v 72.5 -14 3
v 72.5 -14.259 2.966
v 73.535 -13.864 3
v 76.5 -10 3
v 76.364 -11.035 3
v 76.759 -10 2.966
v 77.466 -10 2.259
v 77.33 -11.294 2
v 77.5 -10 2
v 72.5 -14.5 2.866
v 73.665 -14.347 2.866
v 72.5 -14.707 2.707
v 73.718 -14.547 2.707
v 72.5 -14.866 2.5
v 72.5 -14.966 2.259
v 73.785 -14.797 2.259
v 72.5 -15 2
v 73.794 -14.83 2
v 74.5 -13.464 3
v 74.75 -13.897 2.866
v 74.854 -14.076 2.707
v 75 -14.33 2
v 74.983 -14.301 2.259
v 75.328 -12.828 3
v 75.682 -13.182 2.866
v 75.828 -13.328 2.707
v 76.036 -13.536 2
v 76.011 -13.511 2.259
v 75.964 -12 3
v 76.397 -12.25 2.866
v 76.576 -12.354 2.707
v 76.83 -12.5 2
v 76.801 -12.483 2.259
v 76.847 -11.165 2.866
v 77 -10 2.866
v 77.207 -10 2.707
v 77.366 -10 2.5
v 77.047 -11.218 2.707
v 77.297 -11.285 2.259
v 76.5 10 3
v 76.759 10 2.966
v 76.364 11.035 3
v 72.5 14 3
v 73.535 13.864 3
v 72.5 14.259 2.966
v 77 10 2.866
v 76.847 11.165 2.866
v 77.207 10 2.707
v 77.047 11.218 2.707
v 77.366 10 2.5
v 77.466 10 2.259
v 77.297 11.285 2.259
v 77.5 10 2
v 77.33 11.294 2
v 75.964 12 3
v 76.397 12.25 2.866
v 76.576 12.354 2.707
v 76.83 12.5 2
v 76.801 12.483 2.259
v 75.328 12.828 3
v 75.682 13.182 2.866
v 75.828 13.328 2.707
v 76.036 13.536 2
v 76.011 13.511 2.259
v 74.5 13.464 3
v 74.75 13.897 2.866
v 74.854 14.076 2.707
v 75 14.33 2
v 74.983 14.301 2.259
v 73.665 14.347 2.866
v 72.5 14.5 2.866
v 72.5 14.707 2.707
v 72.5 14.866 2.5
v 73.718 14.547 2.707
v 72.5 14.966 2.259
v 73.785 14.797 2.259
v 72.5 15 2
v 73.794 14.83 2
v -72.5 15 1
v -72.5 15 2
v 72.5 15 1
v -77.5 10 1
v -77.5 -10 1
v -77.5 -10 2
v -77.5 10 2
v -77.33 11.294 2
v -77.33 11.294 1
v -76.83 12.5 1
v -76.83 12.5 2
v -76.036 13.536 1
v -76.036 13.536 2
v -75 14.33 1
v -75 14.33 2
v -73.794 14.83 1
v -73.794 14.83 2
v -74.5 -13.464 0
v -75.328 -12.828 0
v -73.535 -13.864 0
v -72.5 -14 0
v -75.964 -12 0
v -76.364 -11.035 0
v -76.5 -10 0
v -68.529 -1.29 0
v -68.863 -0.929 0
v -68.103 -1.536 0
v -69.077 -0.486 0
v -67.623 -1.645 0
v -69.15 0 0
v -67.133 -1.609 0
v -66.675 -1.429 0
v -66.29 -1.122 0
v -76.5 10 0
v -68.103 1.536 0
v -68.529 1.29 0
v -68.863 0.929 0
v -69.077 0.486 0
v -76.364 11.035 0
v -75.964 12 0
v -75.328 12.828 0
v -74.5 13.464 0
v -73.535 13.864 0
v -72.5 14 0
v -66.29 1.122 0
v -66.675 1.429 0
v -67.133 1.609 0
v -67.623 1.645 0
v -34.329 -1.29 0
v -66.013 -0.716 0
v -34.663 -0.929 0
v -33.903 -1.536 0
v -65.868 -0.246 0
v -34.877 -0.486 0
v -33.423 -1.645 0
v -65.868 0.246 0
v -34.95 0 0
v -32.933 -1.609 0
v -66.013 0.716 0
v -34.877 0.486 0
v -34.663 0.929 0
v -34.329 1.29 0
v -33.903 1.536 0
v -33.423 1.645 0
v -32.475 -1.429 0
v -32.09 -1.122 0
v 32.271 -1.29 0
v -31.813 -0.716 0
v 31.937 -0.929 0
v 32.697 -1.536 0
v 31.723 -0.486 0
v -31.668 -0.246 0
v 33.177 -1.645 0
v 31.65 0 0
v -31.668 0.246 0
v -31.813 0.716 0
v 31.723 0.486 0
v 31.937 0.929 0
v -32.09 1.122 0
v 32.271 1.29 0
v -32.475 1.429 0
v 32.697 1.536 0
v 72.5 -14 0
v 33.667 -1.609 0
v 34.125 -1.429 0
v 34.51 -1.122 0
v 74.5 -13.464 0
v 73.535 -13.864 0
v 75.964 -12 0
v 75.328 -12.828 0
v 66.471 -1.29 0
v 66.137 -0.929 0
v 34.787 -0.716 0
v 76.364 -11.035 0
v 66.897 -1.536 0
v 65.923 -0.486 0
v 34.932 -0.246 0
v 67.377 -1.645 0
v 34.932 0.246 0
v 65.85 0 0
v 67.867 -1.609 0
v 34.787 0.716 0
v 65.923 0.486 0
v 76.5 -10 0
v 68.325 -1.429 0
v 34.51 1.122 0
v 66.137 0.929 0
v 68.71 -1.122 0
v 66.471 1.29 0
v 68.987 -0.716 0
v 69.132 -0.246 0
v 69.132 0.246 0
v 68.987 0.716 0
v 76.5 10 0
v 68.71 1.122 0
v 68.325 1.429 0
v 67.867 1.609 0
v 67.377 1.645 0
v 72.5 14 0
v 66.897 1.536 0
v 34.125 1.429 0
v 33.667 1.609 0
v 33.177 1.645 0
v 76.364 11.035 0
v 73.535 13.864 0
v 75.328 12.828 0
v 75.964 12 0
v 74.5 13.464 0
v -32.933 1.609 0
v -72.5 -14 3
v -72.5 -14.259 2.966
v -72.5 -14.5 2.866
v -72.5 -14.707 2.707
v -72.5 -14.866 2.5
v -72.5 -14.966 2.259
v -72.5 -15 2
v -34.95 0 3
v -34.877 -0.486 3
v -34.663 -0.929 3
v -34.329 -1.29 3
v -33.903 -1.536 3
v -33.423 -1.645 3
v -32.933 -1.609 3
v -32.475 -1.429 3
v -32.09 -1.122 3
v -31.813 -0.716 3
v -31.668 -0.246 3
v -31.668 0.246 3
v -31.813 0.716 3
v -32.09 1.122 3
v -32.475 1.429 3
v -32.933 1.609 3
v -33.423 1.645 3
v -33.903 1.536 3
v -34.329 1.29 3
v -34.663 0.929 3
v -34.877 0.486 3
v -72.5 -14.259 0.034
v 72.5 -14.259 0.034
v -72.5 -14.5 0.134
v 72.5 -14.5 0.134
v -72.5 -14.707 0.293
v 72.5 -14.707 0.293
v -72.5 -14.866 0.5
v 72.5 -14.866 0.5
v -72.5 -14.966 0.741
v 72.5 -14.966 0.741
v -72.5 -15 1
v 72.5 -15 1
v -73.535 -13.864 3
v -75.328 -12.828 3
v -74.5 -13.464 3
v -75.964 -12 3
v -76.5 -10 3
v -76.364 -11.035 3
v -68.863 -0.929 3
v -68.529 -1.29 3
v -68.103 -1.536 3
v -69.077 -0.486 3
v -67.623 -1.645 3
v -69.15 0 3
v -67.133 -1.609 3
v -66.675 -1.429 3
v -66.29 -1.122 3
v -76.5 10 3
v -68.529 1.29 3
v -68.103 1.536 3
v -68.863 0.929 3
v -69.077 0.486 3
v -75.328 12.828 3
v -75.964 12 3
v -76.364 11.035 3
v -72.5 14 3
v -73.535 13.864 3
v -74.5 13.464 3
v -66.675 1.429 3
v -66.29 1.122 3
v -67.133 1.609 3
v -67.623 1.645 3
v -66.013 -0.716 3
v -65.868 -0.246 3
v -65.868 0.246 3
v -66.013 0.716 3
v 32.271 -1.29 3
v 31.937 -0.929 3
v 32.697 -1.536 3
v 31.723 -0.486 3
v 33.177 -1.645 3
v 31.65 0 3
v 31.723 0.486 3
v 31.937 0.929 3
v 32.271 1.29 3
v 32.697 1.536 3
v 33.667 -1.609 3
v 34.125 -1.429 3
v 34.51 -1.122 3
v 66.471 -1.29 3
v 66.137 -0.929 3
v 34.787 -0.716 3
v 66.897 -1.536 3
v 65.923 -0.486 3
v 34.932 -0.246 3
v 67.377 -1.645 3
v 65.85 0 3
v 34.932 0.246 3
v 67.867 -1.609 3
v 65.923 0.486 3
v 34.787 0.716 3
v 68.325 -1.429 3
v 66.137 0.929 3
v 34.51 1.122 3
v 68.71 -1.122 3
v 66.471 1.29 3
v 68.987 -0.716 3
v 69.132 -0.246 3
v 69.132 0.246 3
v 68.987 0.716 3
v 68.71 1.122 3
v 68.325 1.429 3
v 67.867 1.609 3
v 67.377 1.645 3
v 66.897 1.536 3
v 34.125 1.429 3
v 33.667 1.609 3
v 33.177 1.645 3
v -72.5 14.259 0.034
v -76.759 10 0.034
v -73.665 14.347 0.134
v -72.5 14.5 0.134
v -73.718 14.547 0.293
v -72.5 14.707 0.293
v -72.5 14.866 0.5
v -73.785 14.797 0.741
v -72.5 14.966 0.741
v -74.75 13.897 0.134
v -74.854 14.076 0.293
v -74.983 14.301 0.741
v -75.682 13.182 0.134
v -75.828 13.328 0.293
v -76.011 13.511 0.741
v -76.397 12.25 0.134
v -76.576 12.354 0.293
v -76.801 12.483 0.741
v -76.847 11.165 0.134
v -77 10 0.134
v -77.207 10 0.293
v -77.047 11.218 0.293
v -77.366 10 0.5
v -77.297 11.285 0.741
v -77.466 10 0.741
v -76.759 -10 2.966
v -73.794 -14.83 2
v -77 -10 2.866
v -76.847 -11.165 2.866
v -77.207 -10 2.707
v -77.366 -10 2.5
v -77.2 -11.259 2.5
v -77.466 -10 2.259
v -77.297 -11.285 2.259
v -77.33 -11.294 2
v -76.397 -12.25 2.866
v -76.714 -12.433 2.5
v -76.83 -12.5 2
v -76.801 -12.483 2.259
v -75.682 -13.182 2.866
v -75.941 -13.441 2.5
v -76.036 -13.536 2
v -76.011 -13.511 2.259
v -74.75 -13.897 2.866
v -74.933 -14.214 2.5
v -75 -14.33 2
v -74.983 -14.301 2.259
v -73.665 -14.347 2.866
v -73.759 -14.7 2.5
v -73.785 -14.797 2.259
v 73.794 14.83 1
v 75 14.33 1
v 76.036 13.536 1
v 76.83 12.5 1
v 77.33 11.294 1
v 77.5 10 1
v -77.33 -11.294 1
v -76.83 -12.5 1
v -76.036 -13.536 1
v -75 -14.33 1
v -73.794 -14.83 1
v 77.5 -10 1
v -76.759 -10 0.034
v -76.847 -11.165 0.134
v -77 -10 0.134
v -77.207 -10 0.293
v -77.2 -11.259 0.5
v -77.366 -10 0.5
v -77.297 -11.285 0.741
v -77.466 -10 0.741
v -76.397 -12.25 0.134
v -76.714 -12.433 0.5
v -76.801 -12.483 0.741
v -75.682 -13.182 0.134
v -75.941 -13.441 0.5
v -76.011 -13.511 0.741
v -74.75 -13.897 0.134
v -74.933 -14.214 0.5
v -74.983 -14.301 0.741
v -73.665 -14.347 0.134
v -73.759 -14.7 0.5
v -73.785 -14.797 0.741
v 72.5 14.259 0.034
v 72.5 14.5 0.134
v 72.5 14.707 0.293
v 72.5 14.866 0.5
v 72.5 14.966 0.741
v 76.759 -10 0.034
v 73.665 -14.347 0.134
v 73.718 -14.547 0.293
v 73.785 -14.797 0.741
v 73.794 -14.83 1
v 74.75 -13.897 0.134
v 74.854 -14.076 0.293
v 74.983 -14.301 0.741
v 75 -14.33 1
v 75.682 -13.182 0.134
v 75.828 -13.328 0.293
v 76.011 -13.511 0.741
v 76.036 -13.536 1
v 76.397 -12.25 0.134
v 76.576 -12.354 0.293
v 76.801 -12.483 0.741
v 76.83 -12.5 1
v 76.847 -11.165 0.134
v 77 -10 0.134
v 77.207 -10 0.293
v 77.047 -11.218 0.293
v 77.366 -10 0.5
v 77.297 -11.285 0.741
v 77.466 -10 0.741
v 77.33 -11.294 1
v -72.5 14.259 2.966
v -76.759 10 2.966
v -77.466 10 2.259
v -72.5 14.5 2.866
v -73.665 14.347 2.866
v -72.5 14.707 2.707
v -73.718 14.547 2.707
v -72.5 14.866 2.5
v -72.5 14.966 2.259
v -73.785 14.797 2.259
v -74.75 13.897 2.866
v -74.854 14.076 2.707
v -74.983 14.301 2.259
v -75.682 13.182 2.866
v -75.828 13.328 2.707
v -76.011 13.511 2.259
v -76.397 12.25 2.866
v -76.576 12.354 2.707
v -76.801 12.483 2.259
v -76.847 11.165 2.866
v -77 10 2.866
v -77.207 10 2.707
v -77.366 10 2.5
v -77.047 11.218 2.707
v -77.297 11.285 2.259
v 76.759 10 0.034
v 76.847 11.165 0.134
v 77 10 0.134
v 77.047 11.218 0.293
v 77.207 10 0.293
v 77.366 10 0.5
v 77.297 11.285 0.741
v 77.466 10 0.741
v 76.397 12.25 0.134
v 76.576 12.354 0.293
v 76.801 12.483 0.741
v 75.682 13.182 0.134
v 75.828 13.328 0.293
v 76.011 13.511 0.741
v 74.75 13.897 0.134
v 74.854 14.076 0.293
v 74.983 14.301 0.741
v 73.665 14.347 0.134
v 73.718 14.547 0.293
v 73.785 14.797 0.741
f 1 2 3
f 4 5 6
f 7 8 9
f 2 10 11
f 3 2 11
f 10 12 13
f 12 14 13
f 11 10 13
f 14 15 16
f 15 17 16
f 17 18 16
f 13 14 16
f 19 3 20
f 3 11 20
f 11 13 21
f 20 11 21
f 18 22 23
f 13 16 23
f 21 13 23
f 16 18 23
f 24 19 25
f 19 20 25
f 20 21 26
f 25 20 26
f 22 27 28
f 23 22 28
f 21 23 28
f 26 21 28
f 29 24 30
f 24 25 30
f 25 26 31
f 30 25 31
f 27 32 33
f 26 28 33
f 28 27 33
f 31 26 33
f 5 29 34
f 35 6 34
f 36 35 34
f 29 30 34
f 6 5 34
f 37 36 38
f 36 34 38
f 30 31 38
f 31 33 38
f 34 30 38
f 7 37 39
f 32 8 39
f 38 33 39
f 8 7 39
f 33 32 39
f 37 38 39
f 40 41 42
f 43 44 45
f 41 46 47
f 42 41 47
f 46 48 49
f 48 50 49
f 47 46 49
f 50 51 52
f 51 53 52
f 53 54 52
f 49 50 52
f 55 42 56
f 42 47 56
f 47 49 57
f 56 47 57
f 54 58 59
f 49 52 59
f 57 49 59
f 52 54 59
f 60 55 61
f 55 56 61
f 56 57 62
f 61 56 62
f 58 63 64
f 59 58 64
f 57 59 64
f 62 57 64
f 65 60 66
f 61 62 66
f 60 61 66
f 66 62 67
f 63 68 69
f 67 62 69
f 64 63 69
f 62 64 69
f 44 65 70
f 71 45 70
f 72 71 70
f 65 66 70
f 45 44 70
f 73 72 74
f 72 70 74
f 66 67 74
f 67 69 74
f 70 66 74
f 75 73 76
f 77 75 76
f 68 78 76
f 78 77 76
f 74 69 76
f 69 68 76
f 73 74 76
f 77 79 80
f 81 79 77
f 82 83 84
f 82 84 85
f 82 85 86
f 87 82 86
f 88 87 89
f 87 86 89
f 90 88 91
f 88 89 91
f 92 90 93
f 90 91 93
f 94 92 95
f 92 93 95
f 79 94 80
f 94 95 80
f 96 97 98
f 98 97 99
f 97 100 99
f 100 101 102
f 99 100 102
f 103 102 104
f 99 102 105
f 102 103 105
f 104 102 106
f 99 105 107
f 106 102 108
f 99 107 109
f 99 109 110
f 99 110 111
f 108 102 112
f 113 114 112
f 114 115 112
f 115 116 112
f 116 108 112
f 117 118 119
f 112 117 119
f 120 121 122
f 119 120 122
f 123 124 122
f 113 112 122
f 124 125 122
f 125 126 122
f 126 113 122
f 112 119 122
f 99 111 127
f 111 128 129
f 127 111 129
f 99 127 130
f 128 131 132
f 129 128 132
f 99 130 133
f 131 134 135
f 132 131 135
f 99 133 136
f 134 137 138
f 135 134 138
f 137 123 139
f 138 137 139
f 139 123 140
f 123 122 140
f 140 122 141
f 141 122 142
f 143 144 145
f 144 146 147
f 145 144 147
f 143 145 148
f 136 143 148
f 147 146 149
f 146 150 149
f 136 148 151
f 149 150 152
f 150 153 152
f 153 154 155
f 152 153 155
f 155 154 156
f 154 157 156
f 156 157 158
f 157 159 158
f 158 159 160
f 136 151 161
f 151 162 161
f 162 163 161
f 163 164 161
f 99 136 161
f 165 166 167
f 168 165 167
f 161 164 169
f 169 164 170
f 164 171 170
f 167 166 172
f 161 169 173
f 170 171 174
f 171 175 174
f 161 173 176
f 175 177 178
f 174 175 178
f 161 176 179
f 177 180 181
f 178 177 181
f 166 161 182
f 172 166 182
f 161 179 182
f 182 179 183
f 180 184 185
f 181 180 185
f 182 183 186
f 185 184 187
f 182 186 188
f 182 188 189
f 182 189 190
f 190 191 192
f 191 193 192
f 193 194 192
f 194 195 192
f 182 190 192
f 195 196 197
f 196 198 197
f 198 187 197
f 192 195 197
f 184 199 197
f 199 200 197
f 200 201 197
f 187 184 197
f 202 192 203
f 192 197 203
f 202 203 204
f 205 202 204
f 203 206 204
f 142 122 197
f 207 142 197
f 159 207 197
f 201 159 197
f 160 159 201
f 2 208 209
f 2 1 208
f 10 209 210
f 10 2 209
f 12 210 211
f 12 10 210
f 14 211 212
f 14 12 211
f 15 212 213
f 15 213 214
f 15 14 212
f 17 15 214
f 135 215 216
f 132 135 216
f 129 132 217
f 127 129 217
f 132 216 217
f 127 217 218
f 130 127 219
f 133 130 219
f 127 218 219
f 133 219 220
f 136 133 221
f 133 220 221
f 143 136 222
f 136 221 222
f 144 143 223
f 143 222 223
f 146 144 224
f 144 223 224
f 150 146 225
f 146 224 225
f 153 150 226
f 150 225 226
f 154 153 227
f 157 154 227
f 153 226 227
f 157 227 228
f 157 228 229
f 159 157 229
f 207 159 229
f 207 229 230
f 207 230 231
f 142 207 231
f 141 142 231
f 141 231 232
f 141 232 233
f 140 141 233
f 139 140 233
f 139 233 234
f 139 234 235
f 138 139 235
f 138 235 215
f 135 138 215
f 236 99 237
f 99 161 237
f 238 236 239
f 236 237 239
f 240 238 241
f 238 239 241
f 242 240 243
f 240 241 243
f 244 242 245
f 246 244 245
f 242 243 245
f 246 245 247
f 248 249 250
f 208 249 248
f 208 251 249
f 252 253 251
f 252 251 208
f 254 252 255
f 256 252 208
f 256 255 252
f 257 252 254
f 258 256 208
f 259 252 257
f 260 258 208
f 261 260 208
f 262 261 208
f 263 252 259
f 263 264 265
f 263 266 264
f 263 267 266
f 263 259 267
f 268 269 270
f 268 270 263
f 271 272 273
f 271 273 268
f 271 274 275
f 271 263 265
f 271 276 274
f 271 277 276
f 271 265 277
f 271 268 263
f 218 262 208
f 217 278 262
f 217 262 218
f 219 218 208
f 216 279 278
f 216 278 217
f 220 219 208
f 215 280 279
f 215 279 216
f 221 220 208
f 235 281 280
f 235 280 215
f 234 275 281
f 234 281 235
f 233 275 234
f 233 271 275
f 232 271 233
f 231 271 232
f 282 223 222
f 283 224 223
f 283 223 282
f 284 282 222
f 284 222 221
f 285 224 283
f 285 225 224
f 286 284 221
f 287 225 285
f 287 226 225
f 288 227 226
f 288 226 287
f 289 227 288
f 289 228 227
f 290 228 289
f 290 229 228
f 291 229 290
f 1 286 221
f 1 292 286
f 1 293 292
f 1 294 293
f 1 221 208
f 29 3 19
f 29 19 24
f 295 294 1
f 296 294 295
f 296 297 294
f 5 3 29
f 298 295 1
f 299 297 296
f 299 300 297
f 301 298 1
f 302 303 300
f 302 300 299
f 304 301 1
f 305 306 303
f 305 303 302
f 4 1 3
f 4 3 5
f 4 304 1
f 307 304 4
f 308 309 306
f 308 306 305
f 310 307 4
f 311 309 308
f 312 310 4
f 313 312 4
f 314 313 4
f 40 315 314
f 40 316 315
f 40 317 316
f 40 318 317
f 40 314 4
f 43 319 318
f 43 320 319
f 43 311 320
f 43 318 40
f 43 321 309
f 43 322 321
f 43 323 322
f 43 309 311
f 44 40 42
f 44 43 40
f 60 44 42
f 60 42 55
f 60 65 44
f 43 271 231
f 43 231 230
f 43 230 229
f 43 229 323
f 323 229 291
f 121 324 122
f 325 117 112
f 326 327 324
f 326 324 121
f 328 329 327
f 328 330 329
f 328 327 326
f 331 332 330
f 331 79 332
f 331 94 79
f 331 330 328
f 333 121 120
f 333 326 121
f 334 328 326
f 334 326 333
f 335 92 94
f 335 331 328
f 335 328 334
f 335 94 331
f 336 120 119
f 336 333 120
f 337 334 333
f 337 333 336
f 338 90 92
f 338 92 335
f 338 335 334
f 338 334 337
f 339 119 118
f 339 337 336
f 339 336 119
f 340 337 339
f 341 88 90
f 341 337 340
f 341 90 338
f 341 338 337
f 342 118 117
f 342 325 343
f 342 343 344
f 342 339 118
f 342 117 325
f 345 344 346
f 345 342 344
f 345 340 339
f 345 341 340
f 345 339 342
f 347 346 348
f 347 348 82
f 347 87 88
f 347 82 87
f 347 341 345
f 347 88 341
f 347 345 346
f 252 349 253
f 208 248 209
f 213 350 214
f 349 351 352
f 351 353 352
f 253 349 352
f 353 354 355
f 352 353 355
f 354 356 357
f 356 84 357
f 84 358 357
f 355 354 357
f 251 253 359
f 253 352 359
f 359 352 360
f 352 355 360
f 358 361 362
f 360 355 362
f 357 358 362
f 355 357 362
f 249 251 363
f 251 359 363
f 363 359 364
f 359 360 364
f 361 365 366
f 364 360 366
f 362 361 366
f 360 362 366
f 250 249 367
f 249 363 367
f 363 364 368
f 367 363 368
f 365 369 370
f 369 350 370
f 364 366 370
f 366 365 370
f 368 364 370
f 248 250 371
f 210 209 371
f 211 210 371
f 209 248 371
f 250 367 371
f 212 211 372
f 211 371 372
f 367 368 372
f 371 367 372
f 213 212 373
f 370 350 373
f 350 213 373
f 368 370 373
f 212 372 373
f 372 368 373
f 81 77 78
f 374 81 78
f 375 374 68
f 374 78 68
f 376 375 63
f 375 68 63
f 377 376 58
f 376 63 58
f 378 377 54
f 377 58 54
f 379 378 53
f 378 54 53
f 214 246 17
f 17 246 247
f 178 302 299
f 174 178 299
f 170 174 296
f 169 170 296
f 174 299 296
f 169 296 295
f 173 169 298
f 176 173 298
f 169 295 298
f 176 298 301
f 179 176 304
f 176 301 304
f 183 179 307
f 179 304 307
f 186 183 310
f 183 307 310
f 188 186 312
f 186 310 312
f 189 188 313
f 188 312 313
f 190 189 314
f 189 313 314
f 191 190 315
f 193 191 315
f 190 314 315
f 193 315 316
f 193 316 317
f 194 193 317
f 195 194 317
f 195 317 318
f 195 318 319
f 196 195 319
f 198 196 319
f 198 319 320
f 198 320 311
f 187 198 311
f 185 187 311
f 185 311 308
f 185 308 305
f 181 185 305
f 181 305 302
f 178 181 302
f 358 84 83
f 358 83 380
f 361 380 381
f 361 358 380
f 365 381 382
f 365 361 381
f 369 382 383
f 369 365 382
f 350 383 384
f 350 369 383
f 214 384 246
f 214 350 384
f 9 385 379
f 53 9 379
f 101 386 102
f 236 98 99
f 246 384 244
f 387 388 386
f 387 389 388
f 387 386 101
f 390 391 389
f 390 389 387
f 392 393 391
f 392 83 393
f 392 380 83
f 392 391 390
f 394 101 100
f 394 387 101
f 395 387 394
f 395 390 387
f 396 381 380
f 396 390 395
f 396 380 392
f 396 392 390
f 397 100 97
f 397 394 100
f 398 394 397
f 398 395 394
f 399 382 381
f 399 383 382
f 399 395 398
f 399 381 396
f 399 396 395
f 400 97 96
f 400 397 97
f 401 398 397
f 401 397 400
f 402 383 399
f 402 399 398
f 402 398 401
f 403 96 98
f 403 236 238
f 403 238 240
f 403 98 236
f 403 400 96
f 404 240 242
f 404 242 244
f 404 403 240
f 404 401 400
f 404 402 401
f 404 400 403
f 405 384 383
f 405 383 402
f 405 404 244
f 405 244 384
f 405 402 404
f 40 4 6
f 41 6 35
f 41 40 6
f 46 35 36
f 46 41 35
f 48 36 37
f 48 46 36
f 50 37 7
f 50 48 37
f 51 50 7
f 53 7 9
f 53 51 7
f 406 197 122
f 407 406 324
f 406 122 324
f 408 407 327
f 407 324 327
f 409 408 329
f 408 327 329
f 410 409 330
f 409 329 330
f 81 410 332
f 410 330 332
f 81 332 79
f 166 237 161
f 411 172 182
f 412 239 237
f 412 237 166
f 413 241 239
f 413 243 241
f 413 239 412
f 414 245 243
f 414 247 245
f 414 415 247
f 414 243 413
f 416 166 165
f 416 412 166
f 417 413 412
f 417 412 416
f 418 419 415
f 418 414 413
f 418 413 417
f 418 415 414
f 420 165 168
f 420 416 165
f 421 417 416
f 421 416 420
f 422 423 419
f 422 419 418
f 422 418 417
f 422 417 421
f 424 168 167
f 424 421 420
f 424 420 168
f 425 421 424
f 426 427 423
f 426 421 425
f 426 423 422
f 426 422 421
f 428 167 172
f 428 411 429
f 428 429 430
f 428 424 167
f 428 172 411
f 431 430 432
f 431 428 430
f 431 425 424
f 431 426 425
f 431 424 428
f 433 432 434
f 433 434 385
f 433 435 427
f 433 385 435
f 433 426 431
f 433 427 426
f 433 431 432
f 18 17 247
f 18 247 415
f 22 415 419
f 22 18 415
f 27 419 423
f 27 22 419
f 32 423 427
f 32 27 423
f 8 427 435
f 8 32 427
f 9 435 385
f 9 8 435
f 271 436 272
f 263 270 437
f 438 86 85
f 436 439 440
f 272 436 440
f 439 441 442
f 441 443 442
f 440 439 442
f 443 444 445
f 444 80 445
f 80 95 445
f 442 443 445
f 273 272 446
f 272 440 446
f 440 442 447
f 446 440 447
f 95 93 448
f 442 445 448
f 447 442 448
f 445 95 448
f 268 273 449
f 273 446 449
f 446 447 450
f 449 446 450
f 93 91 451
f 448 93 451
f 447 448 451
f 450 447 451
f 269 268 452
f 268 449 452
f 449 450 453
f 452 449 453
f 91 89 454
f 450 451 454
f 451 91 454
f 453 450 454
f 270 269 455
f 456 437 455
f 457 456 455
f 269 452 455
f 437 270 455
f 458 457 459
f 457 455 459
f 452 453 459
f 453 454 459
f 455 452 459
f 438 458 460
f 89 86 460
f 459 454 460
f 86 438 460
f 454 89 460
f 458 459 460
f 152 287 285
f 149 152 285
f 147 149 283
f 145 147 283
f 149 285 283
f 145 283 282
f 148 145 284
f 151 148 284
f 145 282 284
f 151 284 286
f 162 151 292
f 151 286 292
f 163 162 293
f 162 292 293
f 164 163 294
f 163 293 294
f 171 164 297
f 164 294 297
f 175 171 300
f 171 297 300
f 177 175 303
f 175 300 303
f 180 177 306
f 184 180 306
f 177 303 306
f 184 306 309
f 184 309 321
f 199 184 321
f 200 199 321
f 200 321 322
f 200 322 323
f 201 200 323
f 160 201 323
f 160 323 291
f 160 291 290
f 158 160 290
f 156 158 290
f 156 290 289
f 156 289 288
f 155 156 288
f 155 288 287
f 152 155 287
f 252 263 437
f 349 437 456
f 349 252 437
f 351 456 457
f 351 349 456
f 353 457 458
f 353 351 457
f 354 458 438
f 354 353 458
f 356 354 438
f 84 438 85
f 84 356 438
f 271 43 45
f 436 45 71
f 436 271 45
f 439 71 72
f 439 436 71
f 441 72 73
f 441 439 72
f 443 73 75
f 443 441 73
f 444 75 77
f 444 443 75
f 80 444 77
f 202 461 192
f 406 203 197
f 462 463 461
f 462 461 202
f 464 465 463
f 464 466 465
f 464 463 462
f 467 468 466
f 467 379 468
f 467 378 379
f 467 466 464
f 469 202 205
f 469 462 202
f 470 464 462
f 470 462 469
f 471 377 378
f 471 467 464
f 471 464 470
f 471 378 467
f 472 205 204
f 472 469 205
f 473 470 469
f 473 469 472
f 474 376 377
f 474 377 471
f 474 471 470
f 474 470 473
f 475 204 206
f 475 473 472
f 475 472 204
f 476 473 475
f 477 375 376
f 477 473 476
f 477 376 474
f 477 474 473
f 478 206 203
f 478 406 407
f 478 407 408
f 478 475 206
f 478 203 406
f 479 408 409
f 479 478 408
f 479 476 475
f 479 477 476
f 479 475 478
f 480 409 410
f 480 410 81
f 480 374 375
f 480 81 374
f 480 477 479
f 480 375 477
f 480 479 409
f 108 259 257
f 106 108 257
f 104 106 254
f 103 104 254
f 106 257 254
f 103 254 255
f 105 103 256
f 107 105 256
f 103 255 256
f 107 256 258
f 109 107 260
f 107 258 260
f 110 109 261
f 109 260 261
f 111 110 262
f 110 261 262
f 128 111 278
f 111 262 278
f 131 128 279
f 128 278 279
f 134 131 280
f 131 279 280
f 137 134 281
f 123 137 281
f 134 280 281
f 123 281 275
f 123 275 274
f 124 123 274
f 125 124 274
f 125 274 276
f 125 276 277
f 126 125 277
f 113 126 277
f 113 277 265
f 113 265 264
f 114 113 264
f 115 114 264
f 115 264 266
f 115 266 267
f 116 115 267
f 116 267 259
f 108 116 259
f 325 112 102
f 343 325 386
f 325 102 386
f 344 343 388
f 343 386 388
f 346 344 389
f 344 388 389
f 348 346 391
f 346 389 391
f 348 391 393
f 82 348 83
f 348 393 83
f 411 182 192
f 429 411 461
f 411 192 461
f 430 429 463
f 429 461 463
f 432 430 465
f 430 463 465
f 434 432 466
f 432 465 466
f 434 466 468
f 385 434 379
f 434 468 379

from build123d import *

# Parameters (mm, degrees)
F0_W     = 155
F0_H     = 30
F1_DEPTH = 3
F2_D     = 3.3
F3_R     = 5
F4_R     = 1
F5_D     = 3.3


with BuildPart() as f1:
    # F0 (on Top) → F1 (new body)
    with BuildSketch(Plane.XY):
        Rectangle(F0_W, F0_H)
    extrude(amount=F1_DEPTH)

    # F2 (through all)
    with Locations(Plane(origin=(0, 0, 0), x_dir=(1, 0, 0), z_dir=(0, 0, -1))):
        with Locations((-67.5, 0), (67.5, 0)):
            Hole(F2_D / 2)

    # F3
    f3_edges = [f1.edges().sort_by_distance(p)[0] for p in [
        (-77.5, 15, 1.5),
        (-77.5, -15, 1.5),
        (77.5, -15, 1.5),
        (77.5, 15, 1.5),
    ]]
    fillet(f3_edges, radius=F3_R)

    # F4
    f4_edges = [f1.edges().sort_by_distance(p)[0] for p in [
        (0, -15, 3),
        (0, -15, 0),
    ]]
    fillet(f4_edges, radius=F4_R)

    # F5 (through all)
    with Locations(Plane(origin=(0, 0, 0), x_dir=(1, 0, 0), z_dir=(0, 0, -1))):
        with Locations((-33.3, 0), (33.3, 0)):
            Hole(F5_D / 2)


solid = f1.part
